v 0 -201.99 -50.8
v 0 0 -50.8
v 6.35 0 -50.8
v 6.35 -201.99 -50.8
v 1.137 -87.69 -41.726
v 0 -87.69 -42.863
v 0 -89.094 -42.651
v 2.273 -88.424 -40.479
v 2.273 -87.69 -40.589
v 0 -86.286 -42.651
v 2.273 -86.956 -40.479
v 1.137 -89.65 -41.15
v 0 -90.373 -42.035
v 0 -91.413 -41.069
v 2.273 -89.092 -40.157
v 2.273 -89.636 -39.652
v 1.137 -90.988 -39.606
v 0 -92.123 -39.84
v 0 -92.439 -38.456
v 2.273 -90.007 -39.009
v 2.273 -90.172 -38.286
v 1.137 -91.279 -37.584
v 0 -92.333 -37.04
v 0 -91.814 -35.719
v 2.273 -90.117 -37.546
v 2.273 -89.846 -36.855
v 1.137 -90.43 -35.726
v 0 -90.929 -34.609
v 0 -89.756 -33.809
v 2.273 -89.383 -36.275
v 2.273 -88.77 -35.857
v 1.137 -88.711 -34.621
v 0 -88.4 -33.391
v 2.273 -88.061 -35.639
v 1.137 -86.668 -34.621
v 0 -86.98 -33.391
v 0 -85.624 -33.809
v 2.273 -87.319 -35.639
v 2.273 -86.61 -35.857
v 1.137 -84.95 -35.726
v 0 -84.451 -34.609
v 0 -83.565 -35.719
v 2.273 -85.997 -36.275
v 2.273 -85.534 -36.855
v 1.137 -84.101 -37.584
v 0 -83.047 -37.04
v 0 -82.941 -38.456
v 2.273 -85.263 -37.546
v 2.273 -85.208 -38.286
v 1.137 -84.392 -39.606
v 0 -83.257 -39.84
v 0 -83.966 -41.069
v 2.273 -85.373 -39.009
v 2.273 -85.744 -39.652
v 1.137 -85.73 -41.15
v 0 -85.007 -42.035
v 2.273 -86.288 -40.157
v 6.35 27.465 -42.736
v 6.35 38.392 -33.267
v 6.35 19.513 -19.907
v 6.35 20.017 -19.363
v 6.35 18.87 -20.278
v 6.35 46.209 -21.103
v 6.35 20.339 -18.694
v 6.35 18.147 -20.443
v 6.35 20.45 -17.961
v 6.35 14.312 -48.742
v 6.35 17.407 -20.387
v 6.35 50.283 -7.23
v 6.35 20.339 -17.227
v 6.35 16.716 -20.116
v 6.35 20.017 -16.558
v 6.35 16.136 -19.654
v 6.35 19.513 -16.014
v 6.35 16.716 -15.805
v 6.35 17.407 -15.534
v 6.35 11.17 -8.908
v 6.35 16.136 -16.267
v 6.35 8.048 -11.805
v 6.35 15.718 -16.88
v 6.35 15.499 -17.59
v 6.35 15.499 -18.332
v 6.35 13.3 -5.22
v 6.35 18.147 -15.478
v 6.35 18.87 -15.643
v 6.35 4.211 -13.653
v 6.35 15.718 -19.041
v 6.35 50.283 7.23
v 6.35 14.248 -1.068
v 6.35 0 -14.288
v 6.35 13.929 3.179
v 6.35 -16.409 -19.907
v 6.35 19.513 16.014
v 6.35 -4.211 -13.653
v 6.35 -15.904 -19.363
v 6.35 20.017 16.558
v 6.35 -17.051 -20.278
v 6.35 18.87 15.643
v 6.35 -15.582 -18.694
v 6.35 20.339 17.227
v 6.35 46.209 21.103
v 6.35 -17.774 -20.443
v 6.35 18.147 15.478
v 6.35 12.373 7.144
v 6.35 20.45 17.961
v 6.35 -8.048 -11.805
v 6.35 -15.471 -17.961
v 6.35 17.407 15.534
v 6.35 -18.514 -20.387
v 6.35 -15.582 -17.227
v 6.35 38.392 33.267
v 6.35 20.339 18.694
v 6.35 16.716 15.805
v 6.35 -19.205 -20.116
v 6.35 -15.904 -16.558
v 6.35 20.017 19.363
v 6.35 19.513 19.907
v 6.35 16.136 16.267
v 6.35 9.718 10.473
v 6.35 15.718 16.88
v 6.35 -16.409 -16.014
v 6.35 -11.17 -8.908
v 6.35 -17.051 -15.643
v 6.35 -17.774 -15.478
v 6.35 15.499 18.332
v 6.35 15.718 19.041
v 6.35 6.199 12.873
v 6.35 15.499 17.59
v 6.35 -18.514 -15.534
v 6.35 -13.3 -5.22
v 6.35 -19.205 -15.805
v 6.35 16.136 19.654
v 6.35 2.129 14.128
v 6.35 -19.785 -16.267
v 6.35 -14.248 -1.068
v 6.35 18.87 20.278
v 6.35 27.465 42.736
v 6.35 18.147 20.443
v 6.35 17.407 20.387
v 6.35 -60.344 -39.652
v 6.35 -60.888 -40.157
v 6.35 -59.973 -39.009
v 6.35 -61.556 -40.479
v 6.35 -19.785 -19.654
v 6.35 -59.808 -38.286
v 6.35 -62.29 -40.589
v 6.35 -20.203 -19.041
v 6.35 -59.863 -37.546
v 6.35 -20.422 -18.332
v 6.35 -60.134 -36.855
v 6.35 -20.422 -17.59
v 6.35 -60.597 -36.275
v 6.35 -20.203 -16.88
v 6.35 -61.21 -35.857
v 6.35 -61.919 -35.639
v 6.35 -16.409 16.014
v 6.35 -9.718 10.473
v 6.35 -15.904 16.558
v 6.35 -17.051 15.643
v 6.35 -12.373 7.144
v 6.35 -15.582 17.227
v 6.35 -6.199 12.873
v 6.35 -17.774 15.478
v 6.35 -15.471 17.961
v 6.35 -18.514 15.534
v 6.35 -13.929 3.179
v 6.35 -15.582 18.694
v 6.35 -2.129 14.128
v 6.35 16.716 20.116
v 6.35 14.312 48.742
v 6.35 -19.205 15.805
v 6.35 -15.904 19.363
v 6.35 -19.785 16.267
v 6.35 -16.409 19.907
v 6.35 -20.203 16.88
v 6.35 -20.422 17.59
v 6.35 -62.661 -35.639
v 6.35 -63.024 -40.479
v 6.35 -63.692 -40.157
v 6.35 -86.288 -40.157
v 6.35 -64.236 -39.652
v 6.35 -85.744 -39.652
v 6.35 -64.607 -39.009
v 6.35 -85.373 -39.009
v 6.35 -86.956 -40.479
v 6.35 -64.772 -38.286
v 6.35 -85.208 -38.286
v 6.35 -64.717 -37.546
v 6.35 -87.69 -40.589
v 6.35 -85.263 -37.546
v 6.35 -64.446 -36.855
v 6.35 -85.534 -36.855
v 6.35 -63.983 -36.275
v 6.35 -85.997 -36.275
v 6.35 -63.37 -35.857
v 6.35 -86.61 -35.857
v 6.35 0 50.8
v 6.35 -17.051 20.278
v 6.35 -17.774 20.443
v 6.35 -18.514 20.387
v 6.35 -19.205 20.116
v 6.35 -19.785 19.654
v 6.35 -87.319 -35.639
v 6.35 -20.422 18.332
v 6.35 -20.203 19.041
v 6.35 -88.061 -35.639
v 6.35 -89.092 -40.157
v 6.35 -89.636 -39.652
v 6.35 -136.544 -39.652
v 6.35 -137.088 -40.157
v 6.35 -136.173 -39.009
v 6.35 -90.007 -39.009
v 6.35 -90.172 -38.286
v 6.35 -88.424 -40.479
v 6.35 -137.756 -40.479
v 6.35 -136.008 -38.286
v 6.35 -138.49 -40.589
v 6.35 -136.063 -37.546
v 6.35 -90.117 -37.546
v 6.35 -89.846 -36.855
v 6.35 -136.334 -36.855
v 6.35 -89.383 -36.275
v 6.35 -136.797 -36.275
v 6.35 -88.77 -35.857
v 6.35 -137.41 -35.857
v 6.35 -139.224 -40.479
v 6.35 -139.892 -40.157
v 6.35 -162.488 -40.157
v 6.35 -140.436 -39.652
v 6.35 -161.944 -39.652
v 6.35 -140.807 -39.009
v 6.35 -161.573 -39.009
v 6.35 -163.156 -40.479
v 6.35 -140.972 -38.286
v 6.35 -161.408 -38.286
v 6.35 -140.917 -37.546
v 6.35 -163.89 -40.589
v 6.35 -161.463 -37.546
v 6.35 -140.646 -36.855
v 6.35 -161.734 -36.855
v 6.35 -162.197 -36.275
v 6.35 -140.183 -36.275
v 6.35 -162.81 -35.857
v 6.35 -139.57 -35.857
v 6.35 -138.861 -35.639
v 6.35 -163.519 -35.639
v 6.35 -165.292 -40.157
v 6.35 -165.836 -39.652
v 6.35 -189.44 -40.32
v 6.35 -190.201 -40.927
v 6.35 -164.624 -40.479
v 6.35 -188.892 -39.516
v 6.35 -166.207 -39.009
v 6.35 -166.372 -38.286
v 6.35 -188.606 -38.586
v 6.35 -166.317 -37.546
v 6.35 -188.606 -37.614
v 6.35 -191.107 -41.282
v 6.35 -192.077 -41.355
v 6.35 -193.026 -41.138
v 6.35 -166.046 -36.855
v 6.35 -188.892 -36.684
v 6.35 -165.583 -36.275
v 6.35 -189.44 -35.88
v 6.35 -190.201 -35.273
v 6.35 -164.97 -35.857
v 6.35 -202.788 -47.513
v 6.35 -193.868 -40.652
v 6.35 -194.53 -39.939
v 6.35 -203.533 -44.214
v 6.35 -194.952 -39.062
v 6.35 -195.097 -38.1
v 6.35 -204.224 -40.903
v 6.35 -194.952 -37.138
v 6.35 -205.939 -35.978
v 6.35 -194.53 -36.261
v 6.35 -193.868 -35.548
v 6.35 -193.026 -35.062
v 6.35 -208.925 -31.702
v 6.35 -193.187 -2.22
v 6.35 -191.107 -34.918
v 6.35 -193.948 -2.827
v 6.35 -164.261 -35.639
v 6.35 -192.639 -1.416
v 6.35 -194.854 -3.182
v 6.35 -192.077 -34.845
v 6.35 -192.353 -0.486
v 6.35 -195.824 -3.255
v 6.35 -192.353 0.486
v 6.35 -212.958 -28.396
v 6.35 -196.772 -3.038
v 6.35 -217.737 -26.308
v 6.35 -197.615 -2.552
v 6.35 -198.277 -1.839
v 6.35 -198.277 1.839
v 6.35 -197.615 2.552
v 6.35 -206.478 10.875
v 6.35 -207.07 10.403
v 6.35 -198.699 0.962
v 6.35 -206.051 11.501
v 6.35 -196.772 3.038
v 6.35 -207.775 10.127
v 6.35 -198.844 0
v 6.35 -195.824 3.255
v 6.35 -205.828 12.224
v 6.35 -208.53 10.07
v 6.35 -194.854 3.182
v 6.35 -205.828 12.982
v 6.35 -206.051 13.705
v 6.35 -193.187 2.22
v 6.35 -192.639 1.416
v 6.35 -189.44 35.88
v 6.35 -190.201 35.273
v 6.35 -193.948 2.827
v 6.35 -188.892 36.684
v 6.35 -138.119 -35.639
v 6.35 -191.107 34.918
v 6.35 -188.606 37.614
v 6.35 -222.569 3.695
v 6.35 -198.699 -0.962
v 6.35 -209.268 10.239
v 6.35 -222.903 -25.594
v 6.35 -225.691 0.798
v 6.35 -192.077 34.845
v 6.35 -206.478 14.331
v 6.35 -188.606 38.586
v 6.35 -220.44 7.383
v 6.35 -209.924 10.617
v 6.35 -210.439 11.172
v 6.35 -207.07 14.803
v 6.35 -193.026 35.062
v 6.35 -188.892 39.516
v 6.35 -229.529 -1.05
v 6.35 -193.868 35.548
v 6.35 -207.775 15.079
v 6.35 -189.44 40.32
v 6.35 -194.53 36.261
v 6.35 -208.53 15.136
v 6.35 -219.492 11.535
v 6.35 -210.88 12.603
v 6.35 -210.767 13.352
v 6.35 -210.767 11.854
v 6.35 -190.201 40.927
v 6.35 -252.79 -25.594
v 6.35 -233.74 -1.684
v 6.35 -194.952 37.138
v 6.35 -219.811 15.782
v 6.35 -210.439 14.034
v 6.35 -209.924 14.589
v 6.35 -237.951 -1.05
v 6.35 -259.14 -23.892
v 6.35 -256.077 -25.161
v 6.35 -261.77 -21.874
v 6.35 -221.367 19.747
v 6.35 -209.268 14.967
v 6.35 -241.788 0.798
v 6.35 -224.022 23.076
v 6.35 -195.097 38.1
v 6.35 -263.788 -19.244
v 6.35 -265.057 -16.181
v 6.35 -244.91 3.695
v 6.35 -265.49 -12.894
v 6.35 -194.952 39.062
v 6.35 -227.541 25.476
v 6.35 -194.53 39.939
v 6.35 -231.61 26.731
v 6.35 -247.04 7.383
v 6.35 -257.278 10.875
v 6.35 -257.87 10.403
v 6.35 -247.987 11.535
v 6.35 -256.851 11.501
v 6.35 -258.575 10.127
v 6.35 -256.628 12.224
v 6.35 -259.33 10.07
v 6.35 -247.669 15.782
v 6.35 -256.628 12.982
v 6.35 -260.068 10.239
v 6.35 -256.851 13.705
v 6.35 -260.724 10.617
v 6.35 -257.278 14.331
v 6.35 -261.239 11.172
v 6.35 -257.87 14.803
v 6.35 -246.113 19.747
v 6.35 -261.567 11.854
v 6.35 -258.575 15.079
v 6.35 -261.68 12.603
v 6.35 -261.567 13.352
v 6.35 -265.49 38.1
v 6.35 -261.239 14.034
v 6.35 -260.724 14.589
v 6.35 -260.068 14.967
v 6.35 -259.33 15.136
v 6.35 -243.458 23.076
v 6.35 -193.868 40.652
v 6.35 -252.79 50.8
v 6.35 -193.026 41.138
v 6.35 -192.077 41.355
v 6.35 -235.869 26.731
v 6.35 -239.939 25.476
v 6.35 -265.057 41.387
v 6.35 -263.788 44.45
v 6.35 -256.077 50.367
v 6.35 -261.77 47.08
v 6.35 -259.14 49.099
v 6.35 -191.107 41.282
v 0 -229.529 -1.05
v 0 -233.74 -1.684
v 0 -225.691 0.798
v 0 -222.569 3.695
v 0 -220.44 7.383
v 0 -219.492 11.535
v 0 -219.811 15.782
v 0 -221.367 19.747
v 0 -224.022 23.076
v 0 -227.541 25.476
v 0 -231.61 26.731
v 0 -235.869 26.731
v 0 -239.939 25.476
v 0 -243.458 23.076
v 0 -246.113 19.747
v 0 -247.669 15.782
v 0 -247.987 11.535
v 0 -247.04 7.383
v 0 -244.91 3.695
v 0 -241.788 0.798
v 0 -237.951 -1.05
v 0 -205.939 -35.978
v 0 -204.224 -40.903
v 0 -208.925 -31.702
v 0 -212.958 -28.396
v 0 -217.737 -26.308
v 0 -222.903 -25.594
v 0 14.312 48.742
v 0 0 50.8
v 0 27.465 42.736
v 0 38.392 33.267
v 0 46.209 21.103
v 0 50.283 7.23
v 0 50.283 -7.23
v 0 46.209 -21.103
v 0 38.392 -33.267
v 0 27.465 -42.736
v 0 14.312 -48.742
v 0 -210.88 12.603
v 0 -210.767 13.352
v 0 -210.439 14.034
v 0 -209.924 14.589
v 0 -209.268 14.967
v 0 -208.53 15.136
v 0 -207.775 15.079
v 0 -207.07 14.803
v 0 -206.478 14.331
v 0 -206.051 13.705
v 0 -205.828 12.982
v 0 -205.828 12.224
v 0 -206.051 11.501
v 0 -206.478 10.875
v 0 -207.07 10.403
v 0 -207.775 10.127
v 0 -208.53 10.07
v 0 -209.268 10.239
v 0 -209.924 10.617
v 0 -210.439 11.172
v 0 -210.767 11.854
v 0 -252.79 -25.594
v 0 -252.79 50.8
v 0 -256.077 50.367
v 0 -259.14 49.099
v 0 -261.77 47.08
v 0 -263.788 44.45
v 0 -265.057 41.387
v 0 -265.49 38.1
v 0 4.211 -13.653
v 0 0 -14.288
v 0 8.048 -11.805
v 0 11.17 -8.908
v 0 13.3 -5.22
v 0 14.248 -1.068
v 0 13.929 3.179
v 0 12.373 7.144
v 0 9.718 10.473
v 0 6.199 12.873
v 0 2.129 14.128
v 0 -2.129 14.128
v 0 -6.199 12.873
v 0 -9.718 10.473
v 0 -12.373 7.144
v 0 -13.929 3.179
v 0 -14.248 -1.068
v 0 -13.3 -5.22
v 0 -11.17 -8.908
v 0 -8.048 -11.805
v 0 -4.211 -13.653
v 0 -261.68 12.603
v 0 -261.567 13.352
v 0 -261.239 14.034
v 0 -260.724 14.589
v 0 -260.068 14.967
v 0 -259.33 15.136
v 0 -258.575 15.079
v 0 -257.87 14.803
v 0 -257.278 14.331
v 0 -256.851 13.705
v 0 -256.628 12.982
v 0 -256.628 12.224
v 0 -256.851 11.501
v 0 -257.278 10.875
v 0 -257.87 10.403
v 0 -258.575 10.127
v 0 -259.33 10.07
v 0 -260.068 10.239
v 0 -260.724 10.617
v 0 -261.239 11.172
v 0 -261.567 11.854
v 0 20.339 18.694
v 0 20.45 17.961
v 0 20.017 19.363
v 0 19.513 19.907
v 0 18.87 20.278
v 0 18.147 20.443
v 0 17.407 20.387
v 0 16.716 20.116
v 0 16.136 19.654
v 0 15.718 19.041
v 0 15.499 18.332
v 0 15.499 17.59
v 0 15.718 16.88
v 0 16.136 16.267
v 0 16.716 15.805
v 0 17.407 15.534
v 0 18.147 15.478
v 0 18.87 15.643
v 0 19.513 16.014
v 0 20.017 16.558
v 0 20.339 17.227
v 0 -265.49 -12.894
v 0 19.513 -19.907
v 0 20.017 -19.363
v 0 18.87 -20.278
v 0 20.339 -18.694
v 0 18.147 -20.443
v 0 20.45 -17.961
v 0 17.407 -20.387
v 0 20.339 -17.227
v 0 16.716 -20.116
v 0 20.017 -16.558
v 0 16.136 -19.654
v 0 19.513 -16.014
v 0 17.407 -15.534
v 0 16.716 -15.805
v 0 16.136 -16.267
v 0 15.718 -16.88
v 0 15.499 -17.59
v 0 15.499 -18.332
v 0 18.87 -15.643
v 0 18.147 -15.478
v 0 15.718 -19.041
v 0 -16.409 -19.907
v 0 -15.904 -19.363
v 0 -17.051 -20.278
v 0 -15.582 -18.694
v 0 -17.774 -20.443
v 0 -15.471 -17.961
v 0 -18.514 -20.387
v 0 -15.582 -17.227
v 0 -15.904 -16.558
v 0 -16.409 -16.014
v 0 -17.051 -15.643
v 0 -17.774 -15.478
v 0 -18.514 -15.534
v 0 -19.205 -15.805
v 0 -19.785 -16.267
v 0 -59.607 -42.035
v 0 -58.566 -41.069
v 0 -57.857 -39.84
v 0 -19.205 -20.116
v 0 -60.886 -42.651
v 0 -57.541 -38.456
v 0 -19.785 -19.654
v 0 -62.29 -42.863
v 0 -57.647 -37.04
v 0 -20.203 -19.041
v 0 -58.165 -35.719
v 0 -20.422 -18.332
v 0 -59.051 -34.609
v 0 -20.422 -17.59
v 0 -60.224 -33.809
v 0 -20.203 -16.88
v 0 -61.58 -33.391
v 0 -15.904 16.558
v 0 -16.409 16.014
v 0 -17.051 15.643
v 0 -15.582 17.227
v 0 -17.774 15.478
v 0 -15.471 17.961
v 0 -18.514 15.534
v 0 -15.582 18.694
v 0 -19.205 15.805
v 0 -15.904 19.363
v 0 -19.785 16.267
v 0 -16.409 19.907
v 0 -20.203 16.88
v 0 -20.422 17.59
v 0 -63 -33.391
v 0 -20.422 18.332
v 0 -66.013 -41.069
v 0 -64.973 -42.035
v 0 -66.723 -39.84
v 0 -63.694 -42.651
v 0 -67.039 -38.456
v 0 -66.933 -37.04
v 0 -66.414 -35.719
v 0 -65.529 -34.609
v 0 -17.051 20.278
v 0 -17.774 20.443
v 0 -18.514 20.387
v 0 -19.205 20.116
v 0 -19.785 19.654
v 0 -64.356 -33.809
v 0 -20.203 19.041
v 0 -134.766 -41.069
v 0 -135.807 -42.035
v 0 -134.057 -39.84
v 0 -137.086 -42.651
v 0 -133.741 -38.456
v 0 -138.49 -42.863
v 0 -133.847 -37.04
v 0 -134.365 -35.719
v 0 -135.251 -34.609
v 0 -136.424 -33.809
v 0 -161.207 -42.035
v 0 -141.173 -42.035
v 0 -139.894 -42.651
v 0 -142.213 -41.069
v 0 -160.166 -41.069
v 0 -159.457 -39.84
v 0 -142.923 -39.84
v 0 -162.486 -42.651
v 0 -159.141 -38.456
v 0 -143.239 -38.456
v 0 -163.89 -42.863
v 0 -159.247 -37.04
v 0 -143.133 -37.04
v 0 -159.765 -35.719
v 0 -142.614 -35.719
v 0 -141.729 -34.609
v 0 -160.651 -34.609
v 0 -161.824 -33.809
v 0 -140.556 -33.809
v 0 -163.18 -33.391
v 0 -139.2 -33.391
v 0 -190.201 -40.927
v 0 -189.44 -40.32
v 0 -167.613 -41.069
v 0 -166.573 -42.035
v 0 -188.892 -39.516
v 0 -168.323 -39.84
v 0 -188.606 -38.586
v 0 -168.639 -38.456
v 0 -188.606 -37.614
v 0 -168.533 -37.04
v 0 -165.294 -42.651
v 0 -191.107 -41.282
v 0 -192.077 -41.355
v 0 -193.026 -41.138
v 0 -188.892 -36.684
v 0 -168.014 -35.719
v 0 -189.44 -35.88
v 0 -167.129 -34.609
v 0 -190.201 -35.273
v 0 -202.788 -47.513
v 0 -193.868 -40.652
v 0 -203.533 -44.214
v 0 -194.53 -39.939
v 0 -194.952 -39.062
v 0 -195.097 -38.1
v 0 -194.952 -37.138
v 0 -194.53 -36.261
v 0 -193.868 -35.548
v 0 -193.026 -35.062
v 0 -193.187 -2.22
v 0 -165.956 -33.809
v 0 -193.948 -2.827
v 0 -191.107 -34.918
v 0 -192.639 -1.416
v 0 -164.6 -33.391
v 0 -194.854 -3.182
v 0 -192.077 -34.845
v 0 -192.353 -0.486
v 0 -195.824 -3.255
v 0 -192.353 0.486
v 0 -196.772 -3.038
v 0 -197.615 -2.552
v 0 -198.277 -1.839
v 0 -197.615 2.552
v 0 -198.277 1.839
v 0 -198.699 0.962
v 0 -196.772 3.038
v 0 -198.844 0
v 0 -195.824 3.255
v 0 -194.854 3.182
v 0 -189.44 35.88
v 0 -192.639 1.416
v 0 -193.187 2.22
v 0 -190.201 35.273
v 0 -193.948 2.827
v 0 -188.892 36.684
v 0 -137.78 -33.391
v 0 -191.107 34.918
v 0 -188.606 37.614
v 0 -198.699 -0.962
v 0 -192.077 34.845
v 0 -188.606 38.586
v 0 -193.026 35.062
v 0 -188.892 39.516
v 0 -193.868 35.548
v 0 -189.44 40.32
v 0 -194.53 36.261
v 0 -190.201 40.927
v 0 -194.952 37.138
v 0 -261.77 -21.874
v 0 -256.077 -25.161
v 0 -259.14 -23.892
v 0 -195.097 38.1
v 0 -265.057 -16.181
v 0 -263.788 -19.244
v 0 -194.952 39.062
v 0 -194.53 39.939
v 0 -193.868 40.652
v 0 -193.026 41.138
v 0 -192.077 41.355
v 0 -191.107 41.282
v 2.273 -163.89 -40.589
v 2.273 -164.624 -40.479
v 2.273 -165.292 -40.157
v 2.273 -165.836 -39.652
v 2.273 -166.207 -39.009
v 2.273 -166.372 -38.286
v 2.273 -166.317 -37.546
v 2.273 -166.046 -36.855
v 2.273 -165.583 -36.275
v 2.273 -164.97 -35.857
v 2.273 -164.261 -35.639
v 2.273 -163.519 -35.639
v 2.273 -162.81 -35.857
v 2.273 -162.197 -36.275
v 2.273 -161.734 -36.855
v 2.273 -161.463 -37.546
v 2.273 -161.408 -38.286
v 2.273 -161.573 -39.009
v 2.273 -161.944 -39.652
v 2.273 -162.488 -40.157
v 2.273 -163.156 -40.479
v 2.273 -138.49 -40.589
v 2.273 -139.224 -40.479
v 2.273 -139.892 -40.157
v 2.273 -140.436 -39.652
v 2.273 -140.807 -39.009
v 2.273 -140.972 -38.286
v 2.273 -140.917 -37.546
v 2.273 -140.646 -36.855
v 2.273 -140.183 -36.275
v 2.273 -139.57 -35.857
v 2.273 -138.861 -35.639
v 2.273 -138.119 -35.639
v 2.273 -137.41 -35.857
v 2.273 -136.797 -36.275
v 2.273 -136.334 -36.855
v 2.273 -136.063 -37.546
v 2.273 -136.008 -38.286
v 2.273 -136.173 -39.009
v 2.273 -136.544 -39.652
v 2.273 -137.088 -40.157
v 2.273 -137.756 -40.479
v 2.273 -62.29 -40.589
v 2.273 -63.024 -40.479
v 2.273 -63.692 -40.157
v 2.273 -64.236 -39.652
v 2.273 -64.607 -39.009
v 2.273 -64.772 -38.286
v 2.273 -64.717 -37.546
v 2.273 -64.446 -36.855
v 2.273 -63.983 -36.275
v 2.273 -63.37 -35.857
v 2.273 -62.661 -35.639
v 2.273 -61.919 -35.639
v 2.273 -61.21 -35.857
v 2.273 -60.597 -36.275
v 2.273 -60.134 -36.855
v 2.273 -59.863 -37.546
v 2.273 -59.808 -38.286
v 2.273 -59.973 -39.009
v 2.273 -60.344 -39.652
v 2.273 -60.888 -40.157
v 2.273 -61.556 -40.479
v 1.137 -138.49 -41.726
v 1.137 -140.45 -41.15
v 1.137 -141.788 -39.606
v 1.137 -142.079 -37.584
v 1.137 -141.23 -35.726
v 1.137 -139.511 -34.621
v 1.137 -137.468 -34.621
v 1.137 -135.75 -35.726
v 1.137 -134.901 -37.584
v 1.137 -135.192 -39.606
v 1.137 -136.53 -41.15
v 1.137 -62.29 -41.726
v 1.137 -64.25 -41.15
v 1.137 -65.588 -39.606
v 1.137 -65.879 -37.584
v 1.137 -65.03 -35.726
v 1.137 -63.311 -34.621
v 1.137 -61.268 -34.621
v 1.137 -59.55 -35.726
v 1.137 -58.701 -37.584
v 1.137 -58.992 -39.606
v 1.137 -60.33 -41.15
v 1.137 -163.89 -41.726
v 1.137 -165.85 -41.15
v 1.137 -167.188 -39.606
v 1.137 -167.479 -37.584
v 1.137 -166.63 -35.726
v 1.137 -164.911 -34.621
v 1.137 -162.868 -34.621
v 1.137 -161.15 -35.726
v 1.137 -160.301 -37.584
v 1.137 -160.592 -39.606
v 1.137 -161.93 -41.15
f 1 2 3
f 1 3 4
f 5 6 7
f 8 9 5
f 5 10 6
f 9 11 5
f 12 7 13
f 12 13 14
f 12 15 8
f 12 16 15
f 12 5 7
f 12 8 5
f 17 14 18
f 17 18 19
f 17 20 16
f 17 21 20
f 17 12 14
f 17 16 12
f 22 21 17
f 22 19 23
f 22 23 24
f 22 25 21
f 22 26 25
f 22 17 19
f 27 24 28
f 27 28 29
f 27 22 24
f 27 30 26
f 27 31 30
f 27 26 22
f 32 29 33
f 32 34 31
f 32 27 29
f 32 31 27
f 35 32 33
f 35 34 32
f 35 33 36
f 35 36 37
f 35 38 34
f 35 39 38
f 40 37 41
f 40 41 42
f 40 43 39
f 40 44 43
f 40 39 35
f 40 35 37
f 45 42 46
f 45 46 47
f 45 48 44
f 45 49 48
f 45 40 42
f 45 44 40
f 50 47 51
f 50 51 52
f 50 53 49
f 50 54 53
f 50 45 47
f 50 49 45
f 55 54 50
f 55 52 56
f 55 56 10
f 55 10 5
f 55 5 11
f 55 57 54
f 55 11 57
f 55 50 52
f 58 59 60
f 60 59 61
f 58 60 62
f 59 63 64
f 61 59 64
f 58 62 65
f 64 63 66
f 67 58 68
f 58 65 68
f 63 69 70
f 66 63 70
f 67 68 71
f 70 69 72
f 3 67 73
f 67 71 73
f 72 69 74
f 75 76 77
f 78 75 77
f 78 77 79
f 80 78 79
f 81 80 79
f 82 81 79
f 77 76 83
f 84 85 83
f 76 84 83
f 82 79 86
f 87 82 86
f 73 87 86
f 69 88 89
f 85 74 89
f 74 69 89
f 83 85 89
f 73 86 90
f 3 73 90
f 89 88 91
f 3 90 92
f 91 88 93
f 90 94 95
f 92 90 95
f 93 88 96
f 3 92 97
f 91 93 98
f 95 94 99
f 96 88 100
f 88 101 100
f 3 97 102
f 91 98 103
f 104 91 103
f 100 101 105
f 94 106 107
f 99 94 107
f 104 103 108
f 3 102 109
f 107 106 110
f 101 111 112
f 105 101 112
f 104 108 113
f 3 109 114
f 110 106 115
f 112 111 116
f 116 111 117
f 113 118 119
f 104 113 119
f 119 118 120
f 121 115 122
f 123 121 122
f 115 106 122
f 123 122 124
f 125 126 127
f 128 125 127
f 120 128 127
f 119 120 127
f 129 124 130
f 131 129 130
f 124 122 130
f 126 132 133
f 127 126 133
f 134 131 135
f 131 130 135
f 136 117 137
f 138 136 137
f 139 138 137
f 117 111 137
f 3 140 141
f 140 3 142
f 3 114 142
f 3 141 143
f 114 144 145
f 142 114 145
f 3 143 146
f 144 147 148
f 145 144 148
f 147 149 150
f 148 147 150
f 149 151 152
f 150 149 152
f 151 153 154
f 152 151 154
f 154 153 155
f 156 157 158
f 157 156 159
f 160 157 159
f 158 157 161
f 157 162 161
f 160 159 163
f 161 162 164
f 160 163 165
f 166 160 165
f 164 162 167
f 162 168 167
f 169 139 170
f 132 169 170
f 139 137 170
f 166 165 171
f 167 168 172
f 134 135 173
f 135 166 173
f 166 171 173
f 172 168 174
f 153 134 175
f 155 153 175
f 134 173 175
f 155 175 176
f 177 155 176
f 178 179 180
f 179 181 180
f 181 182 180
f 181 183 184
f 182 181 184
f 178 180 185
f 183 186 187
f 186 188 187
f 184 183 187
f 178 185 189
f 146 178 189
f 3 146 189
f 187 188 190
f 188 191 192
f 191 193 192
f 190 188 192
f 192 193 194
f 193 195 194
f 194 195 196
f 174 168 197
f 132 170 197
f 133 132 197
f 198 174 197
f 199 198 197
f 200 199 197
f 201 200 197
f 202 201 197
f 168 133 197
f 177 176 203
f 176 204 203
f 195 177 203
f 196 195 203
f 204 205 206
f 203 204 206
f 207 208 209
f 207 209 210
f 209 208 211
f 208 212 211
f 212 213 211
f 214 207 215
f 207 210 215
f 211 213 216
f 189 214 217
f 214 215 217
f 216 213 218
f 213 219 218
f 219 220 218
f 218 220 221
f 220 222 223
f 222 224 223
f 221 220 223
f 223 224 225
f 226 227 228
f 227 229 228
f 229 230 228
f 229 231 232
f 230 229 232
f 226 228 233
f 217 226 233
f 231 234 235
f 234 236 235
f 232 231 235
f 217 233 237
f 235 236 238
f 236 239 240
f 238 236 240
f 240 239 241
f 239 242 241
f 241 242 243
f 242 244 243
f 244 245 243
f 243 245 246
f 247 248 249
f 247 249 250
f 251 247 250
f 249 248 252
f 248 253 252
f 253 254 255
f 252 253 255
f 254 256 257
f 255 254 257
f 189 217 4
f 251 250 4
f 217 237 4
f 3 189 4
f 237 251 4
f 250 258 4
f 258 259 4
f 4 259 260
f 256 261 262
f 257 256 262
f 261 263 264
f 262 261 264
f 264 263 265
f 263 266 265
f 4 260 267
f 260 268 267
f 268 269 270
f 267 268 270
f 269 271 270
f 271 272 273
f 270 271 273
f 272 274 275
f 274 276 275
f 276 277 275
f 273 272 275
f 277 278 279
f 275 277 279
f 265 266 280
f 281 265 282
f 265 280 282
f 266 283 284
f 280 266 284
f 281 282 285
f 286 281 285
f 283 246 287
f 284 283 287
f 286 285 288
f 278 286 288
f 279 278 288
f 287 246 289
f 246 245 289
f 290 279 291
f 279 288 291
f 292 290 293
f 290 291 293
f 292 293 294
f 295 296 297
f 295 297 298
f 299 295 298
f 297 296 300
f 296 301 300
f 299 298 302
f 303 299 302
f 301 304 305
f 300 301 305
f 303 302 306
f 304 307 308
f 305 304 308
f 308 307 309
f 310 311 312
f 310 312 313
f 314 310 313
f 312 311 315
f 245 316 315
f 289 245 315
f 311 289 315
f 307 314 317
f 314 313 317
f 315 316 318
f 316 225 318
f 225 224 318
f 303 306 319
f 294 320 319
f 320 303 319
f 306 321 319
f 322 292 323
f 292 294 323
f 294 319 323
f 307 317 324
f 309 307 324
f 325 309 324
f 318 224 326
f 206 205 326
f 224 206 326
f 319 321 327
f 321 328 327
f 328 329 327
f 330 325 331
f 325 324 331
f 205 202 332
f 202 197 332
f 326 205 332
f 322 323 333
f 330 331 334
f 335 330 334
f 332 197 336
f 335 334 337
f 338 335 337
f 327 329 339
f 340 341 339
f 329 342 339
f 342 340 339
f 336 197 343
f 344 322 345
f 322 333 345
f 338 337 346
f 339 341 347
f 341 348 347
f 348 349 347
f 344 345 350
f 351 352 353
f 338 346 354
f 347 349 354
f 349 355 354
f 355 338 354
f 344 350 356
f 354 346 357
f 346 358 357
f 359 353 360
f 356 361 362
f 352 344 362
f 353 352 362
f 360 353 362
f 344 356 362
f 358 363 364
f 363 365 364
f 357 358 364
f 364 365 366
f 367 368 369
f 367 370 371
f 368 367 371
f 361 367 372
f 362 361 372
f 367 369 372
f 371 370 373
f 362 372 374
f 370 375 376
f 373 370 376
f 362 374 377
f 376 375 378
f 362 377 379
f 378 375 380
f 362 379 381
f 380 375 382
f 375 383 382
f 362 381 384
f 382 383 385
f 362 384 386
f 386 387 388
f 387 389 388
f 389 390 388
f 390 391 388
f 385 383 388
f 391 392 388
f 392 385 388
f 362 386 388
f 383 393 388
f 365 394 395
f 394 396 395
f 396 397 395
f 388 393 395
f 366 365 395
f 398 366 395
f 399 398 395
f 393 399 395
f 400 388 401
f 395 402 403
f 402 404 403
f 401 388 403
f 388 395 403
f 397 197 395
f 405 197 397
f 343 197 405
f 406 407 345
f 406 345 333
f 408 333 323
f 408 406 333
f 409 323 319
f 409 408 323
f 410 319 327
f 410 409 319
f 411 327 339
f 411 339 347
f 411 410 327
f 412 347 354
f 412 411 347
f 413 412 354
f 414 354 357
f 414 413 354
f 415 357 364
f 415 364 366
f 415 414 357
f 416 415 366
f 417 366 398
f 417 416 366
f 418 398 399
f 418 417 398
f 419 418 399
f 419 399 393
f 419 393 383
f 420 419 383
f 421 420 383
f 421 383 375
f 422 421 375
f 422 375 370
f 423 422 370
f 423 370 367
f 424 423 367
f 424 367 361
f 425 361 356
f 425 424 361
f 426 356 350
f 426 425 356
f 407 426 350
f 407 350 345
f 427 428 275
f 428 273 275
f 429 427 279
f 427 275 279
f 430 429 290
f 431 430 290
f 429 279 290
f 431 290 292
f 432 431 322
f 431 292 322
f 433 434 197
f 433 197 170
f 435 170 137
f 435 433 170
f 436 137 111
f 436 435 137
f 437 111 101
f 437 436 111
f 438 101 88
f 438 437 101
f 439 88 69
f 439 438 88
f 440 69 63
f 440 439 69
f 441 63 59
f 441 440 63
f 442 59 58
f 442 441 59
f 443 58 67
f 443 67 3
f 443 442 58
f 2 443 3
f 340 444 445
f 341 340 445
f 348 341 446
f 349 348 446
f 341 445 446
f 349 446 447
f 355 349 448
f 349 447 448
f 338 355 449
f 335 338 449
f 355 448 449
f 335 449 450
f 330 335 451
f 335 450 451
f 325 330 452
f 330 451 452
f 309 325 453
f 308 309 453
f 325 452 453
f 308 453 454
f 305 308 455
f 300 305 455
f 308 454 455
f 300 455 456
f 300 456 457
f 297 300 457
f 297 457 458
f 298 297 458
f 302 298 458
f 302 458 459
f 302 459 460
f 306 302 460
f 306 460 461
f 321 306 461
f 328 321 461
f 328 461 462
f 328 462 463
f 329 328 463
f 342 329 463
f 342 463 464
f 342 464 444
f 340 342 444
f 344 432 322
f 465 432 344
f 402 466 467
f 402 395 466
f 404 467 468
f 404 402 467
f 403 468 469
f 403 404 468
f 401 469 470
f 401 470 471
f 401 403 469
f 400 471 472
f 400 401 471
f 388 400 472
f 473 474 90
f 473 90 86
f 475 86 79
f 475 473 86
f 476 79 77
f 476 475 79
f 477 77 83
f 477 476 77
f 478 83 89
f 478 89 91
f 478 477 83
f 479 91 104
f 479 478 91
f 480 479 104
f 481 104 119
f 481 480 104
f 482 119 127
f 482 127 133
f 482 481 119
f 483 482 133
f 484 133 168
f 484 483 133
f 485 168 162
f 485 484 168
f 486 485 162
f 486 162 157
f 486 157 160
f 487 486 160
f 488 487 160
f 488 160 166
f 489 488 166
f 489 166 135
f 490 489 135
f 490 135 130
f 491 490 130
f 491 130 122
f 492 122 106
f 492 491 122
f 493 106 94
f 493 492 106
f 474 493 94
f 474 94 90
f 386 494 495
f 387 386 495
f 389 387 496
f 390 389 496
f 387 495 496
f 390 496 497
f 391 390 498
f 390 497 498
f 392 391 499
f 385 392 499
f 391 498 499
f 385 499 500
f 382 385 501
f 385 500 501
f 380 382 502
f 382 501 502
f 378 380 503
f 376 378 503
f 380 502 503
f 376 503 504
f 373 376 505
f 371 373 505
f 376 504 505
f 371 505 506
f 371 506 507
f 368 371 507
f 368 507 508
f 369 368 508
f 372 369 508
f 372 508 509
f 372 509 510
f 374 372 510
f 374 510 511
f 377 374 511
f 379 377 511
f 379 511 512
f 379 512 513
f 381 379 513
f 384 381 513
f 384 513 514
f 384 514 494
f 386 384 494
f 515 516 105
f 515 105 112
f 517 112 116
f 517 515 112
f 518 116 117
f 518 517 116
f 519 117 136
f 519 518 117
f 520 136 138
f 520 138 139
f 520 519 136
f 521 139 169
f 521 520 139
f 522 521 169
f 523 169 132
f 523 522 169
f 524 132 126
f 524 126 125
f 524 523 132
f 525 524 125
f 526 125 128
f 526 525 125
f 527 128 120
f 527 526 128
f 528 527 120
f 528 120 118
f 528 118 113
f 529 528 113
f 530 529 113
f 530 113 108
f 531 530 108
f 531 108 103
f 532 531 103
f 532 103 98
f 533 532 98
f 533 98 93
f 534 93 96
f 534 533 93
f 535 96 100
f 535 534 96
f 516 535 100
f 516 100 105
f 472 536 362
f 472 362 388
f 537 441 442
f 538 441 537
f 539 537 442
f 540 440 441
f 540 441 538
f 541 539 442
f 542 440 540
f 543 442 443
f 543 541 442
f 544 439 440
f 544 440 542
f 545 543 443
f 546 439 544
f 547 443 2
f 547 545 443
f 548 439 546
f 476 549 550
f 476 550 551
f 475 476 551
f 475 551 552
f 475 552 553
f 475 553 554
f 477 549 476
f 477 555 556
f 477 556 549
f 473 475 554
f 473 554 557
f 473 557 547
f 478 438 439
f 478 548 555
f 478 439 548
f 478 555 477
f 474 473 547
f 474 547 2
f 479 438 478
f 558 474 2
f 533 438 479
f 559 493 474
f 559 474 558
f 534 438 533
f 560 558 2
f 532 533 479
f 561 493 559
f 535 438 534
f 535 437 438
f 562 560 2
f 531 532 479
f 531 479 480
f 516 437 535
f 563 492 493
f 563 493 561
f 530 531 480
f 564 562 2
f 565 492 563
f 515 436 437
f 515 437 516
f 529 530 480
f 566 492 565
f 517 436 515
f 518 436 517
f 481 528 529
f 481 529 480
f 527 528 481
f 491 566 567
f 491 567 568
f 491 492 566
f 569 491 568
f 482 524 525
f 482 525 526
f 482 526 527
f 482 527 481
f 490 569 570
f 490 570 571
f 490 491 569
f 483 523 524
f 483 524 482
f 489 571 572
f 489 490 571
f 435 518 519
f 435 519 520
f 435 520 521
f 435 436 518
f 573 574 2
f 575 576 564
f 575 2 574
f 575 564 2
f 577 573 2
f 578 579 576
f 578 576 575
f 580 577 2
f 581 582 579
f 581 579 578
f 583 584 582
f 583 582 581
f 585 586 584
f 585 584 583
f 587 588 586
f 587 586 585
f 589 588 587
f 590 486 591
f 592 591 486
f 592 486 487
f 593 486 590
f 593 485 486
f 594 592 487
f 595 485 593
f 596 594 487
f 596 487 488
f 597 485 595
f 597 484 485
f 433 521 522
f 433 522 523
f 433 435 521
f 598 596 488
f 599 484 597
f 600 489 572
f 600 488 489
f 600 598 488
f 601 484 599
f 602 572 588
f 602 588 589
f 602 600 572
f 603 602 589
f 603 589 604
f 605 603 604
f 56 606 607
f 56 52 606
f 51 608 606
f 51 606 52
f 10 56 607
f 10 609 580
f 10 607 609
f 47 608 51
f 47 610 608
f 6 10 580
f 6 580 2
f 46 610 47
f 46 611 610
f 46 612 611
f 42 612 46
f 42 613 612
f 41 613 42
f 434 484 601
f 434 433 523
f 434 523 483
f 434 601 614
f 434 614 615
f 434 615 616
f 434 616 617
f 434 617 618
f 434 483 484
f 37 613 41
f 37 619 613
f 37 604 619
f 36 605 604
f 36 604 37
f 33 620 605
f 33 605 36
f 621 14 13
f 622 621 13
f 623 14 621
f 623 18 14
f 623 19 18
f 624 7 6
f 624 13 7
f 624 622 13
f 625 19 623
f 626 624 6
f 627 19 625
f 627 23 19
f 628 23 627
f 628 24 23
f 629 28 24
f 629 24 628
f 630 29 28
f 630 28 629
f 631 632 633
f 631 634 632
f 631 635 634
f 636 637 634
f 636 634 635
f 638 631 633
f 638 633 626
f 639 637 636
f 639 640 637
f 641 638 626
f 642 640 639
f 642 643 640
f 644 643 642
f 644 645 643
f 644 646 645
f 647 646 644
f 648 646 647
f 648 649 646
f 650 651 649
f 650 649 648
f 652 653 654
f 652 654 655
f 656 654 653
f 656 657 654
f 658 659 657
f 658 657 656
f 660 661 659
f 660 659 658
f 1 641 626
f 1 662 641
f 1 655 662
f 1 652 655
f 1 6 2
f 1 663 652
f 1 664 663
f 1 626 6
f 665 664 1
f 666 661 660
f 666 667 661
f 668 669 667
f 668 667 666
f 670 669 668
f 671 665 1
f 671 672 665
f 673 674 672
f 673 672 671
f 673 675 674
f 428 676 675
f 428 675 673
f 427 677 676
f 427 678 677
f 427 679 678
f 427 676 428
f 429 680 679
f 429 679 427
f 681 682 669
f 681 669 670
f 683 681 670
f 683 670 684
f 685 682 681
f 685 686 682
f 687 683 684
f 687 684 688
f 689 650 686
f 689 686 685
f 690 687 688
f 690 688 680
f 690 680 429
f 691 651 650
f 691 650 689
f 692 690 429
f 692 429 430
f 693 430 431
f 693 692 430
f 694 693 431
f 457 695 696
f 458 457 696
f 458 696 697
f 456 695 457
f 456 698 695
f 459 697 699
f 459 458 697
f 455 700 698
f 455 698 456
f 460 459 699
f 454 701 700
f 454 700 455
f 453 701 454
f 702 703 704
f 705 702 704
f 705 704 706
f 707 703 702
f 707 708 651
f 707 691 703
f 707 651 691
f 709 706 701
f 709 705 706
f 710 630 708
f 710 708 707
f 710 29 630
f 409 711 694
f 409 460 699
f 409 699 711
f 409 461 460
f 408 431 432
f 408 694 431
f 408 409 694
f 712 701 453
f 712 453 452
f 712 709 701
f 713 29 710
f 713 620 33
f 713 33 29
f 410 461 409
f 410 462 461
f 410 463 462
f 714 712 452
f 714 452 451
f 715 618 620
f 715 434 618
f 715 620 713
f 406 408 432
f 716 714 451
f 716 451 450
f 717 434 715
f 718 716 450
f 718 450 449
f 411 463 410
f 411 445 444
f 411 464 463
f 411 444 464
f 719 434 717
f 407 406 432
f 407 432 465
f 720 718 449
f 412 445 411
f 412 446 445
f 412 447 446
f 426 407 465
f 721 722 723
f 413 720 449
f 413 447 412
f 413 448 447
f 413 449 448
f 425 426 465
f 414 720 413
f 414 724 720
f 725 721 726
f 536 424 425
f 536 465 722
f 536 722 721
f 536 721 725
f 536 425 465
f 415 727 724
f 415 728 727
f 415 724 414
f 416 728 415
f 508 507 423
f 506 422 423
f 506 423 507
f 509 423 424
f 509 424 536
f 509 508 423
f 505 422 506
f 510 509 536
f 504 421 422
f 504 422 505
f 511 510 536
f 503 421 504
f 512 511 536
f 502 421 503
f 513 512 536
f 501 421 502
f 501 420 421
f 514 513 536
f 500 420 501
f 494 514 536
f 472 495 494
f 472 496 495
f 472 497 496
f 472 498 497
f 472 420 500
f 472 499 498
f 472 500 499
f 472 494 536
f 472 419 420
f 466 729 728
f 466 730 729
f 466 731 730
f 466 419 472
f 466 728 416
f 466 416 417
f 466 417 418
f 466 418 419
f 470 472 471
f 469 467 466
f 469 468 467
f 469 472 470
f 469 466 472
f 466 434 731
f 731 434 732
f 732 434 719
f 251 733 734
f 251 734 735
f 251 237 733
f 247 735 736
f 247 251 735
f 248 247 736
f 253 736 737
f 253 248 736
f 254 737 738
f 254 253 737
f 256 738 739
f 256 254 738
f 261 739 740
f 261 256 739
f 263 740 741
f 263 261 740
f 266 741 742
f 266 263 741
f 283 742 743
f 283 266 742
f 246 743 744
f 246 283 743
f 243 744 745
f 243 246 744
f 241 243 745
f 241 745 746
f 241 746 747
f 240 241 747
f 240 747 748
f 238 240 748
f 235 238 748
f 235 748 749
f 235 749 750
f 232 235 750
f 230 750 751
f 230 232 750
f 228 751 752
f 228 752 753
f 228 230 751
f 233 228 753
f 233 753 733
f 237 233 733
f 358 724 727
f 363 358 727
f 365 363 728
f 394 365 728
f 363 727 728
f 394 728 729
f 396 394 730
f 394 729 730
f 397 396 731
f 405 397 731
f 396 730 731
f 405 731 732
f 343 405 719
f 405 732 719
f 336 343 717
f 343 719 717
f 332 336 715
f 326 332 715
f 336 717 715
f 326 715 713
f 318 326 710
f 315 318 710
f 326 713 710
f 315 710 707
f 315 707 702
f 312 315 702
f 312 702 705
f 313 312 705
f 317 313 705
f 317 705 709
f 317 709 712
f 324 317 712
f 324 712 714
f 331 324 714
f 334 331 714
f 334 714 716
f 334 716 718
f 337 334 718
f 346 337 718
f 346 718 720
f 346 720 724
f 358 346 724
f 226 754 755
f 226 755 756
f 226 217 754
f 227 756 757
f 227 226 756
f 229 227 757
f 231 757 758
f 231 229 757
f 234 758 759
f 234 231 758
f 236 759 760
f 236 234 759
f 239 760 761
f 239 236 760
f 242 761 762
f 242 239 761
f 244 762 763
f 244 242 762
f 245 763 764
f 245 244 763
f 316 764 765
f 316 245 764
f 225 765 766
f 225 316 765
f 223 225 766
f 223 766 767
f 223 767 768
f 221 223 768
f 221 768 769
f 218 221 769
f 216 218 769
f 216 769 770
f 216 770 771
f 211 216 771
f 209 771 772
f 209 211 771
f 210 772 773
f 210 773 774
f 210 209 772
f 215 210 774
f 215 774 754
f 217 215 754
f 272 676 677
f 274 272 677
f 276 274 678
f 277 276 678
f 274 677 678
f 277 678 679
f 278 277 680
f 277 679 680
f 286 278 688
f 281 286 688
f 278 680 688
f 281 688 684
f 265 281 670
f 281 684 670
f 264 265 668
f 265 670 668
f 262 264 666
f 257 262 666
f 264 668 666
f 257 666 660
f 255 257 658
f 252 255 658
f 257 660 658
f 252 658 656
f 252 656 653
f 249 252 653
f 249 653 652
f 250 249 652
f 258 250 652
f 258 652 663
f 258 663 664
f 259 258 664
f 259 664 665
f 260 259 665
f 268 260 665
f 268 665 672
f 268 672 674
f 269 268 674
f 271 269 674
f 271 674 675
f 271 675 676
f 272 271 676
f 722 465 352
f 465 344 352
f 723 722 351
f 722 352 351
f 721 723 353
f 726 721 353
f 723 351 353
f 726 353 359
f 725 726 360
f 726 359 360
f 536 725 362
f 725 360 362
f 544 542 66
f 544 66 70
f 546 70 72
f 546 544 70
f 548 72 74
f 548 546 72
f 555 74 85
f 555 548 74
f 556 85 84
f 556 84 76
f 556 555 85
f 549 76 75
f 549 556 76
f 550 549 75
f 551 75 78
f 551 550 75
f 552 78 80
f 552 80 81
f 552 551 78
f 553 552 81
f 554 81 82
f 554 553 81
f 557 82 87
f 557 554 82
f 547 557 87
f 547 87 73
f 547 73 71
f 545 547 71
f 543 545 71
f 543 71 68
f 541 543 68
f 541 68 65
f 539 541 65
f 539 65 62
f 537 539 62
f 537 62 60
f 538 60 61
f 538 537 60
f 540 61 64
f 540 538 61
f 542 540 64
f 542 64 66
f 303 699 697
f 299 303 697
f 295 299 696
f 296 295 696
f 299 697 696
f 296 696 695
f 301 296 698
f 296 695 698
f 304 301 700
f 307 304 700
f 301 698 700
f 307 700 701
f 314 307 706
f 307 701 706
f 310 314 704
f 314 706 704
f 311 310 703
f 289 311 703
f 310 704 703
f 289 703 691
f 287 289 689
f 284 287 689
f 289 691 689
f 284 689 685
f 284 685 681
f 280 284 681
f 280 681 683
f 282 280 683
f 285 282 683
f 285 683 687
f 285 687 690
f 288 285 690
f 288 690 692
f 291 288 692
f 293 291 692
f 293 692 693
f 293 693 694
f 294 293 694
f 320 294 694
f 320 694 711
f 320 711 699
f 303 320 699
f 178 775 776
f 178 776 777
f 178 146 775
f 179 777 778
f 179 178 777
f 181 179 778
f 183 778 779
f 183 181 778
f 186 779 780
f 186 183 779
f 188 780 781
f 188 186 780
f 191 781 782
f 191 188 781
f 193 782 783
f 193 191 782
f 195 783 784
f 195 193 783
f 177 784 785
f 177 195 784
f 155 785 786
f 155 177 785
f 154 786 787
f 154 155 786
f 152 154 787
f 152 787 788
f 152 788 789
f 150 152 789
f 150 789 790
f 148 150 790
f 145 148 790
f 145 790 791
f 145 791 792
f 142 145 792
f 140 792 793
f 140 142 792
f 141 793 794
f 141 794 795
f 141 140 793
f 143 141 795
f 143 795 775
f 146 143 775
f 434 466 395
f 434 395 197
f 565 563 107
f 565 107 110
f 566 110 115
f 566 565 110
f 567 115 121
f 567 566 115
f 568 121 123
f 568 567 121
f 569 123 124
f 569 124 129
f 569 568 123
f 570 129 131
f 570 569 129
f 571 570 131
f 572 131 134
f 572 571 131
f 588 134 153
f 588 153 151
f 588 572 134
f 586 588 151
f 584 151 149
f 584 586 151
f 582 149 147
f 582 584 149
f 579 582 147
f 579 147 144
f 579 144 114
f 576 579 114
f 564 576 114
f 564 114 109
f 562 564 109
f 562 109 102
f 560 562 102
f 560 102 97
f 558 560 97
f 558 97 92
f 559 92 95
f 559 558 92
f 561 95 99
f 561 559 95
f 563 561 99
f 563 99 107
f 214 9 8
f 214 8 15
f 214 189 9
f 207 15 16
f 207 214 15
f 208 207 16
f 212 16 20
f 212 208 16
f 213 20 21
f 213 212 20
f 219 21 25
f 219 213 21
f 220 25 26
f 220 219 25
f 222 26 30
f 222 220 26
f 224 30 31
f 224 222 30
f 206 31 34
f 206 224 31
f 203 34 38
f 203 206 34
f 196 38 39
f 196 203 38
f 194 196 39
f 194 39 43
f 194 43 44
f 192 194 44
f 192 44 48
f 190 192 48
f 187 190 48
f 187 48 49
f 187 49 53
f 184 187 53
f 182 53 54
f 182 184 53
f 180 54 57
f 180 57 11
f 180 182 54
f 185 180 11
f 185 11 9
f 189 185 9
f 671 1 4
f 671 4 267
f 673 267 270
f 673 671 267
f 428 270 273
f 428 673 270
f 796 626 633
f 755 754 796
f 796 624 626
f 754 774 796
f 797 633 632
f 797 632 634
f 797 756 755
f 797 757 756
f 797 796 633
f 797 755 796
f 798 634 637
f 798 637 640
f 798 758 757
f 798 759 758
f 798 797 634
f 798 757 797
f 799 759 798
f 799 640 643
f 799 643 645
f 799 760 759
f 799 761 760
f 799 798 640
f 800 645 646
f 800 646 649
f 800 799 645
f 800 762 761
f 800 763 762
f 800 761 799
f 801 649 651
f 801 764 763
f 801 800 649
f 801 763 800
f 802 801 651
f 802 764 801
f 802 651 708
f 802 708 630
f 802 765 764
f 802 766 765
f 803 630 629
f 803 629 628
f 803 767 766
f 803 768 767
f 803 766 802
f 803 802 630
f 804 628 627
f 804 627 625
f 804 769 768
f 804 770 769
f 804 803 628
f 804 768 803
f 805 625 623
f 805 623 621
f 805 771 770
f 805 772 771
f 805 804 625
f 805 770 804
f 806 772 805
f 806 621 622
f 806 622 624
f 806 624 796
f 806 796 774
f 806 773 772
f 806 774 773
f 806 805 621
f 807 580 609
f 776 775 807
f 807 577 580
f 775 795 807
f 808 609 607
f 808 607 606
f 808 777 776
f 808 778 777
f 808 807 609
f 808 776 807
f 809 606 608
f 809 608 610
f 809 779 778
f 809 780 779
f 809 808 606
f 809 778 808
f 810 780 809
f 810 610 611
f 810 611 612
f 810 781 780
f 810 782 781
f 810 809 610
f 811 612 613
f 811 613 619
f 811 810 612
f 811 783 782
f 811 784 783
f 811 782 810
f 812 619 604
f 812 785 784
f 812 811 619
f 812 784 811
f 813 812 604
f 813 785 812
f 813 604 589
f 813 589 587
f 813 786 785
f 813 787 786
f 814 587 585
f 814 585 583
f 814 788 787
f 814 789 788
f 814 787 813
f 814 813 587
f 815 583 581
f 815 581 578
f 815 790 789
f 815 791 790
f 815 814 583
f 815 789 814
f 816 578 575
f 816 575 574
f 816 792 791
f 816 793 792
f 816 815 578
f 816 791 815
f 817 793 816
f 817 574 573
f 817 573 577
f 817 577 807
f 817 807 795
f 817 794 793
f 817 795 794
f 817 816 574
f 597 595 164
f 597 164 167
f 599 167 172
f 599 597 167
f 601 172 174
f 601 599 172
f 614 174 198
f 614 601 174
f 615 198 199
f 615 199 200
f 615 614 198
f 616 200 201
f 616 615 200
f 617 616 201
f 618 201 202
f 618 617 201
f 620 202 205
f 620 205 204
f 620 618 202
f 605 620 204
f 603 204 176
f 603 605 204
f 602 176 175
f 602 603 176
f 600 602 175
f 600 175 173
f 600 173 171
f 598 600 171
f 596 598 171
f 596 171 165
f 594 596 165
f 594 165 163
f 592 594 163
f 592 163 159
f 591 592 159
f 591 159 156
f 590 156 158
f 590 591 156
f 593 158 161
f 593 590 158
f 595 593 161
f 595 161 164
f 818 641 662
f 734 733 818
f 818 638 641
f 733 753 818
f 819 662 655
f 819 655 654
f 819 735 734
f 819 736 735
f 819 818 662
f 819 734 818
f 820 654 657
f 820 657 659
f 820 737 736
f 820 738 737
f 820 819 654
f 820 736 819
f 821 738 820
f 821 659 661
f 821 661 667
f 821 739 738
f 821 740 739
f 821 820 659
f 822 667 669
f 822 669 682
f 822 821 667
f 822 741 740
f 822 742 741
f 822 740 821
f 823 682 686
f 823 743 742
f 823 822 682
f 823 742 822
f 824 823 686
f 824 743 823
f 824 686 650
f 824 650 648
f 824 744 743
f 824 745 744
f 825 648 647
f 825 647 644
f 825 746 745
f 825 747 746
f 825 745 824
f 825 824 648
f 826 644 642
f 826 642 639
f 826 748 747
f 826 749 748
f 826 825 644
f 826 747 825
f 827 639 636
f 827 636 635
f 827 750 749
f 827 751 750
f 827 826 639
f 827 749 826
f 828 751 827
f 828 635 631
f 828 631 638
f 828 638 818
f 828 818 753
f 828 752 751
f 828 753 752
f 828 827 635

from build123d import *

# Parameters (mm, degrees)
SKETCH1_R                           = 14.2875
BOSS_EXTRUDE1_DEPTH                 = 6.35
F_0_257_DIAMETER_HOLE1_D            = 6.5278
F_9_0_2_DIAMETER_HOLE1_D            = 5.08
FILLET2_R                           = 12.7
FILLET1_R                           = 19.05
F_9_0_196_DIAMETER_HOLE1_AT_2_COUNT = 2
F_9_0_196_DIAMETER_HOLE1_AT_2_PITCH = 25.4
F_9_0_196_DIAMETER_HOLE1_AT_3_COUNT = 2
F_9_0_196_DIAMETER_HOLE1_AT_3_PITCH = 76.2
F_9_0_196_DIAMETER_HOLE1_AT_4_COUNT = 2
F_9_0_196_DIAMETER_HOLE1_AT_4_PITCH = 101.6
F_9_0_196_DIAMETER_HOLE2_OUTLINE_R  = 2.4892
F_9_0_196_DIAMETER_HOLE2_DEPTH      = 6.35


# Read off the part's stored shape, not the designer's step: #9 (0.196) Diameter Hole2
with BuildPart() as part:
    # Sketch1 → Boss-Extrude1 (new body)
    with BuildSketch(Plane.YZ):
        with BuildLine():
            Line((0, -50.8), (-201.989896777, -50.8))
            ThreePointArc((-201.989896777, -50.8), (-204.733971085, -38.269563411), (-206.701492618, -25.593970963))
            Line((-206.701492618, -25.593970963), (-265.489896777, -25.593970963))
            Line((-265.489896777, -25.593970963), (-265.489896777, 50.8))
            Line((-265.489896777, 50.8), (-201.989896777, 50.8))
            Line((-201.989896777, 50.8), (0, 50.8))
            ThreePointArc((0, 50.8), (50.8, 0), (0, -50.8))
        make_face()
        with Locations(Location((0, 0, 0), (0, 0, 270))):
            Circle(SKETCH1_R, mode=Mode.SUBTRACT)
        with Locations(Location((-233.739896777, 12.603014519, 0), (0, 0, 270))):
            Circle(SKETCH1_R, mode=Mode.SUBTRACT)
    extrude(amount=BOSS_EXTRUDE1_DEPTH)

    # F (0.257) Diameter Hole1 (through all)
    with Locations(Plane.YZ.offset(6.35)):
        with Locations((0, 0), (-191.833069099, -38.1), (-195.58, 0), (-191.833069099, 38.1)):
            Hole(F_0_257_DIAMETER_HOLE1_D / 2)

    # #9 (0.2) Diameter Hole1 (through all)
    with Locations(Plane.YZ.offset(6.35)):
        with Locations((-259.139896777, 12.603014519), (-208.339896777, 12.603014519)):
            Hole(F_9_0_2_DIAMETER_HOLE1_D / 2)

    # Fillet2
    fillet2_edges = [part.edges().sort_by_distance(p)[0] for p in [
        (3.175, -265.489896777, -25.593970963),
        (3.175, -265.489896777, 50.8),
    ]]
    fillet(fillet2_edges, radius=FILLET2_R)

    # Fillet1
    fillet1_edges = [part.edges().sort_by_distance(p)[0] for p in [
        (3.175, -206.701492618, -25.593970963),
    ]]
    fillet(fillet1_edges, radius=FILLET1_R)

    # Sketch9 → #9 (0.196) Diameter Hole1 (revolve, cut)
    with BuildSketch(Plane(origin=(6.35, -163.889896777, -38.1), x_dir=(0, 0, -1), z_dir=(0, 1, 0))):
        Polygon((0, 0), (0, 6.35), (4.7625, 6.35), (2.4892, 4.0767), (2.4892, 0), align=None)
    f_9_0_196_diameter_hole1 = revolve(axis=Axis((12.7, -163.889896777, -38.1), (-1, 0, 0)), mode=Mode.SUBTRACT)

    # #9 (0.196) Diameter Hole1 at 2: #9 (0.196) Diameter Hole1 ×2
    with Locations(*[(0, i * F_9_0_196_DIAMETER_HOLE1_AT_2_PITCH, 0) for i in range(1, F_9_0_196_DIAMETER_HOLE1_AT_2_COUNT)]):
        add(f_9_0_196_diameter_hole1, mode=Mode.SUBTRACT)

    # #9 (0.196) Diameter Hole1 at 3: #9 (0.196) Diameter Hole1 ×2
    with Locations(*[(0, i * F_9_0_196_DIAMETER_HOLE1_AT_3_PITCH, 0) for i in range(1, F_9_0_196_DIAMETER_HOLE1_AT_3_COUNT)]):
        add(f_9_0_196_diameter_hole1, mode=Mode.SUBTRACT)

    # #9 (0.196) Diameter Hole1 at 4: #9 (0.196) Diameter Hole1 ×2
    with Locations(*[(0, i * F_9_0_196_DIAMETER_HOLE1_AT_4_PITCH, 0) for i in range(1, F_9_0_196_DIAMETER_HOLE1_AT_4_COUNT)]):
        add(f_9_0_196_diameter_hole1, mode=Mode.SUBTRACT)

    # #9 (0.196) Diameter Hole2 outline → #9 (0.196) Diameter Hole2 (cut)
    with BuildSketch(Plane.YZ):
        with Locations((-17.960512242, -17.960512242)):
            Circle(F_9_0_196_DIAMETER_HOLE2_OUTLINE_R)
        with Locations((17.960512242, -17.960512242)):
            Circle(F_9_0_196_DIAMETER_HOLE2_OUTLINE_R)
        with Locations((17.960512242, 17.960512242)):
            Circle(F_9_0_196_DIAMETER_HOLE2_OUTLINE_R)
        with Locations((-17.960512242, 17.960512242)):
            Circle(F_9_0_196_DIAMETER_HOLE2_OUTLINE_R)
    extrude(amount=F_9_0_196_DIAMETER_HOLE2_DEPTH, mode=Mode.SUBTRACT)


solid = part.part
